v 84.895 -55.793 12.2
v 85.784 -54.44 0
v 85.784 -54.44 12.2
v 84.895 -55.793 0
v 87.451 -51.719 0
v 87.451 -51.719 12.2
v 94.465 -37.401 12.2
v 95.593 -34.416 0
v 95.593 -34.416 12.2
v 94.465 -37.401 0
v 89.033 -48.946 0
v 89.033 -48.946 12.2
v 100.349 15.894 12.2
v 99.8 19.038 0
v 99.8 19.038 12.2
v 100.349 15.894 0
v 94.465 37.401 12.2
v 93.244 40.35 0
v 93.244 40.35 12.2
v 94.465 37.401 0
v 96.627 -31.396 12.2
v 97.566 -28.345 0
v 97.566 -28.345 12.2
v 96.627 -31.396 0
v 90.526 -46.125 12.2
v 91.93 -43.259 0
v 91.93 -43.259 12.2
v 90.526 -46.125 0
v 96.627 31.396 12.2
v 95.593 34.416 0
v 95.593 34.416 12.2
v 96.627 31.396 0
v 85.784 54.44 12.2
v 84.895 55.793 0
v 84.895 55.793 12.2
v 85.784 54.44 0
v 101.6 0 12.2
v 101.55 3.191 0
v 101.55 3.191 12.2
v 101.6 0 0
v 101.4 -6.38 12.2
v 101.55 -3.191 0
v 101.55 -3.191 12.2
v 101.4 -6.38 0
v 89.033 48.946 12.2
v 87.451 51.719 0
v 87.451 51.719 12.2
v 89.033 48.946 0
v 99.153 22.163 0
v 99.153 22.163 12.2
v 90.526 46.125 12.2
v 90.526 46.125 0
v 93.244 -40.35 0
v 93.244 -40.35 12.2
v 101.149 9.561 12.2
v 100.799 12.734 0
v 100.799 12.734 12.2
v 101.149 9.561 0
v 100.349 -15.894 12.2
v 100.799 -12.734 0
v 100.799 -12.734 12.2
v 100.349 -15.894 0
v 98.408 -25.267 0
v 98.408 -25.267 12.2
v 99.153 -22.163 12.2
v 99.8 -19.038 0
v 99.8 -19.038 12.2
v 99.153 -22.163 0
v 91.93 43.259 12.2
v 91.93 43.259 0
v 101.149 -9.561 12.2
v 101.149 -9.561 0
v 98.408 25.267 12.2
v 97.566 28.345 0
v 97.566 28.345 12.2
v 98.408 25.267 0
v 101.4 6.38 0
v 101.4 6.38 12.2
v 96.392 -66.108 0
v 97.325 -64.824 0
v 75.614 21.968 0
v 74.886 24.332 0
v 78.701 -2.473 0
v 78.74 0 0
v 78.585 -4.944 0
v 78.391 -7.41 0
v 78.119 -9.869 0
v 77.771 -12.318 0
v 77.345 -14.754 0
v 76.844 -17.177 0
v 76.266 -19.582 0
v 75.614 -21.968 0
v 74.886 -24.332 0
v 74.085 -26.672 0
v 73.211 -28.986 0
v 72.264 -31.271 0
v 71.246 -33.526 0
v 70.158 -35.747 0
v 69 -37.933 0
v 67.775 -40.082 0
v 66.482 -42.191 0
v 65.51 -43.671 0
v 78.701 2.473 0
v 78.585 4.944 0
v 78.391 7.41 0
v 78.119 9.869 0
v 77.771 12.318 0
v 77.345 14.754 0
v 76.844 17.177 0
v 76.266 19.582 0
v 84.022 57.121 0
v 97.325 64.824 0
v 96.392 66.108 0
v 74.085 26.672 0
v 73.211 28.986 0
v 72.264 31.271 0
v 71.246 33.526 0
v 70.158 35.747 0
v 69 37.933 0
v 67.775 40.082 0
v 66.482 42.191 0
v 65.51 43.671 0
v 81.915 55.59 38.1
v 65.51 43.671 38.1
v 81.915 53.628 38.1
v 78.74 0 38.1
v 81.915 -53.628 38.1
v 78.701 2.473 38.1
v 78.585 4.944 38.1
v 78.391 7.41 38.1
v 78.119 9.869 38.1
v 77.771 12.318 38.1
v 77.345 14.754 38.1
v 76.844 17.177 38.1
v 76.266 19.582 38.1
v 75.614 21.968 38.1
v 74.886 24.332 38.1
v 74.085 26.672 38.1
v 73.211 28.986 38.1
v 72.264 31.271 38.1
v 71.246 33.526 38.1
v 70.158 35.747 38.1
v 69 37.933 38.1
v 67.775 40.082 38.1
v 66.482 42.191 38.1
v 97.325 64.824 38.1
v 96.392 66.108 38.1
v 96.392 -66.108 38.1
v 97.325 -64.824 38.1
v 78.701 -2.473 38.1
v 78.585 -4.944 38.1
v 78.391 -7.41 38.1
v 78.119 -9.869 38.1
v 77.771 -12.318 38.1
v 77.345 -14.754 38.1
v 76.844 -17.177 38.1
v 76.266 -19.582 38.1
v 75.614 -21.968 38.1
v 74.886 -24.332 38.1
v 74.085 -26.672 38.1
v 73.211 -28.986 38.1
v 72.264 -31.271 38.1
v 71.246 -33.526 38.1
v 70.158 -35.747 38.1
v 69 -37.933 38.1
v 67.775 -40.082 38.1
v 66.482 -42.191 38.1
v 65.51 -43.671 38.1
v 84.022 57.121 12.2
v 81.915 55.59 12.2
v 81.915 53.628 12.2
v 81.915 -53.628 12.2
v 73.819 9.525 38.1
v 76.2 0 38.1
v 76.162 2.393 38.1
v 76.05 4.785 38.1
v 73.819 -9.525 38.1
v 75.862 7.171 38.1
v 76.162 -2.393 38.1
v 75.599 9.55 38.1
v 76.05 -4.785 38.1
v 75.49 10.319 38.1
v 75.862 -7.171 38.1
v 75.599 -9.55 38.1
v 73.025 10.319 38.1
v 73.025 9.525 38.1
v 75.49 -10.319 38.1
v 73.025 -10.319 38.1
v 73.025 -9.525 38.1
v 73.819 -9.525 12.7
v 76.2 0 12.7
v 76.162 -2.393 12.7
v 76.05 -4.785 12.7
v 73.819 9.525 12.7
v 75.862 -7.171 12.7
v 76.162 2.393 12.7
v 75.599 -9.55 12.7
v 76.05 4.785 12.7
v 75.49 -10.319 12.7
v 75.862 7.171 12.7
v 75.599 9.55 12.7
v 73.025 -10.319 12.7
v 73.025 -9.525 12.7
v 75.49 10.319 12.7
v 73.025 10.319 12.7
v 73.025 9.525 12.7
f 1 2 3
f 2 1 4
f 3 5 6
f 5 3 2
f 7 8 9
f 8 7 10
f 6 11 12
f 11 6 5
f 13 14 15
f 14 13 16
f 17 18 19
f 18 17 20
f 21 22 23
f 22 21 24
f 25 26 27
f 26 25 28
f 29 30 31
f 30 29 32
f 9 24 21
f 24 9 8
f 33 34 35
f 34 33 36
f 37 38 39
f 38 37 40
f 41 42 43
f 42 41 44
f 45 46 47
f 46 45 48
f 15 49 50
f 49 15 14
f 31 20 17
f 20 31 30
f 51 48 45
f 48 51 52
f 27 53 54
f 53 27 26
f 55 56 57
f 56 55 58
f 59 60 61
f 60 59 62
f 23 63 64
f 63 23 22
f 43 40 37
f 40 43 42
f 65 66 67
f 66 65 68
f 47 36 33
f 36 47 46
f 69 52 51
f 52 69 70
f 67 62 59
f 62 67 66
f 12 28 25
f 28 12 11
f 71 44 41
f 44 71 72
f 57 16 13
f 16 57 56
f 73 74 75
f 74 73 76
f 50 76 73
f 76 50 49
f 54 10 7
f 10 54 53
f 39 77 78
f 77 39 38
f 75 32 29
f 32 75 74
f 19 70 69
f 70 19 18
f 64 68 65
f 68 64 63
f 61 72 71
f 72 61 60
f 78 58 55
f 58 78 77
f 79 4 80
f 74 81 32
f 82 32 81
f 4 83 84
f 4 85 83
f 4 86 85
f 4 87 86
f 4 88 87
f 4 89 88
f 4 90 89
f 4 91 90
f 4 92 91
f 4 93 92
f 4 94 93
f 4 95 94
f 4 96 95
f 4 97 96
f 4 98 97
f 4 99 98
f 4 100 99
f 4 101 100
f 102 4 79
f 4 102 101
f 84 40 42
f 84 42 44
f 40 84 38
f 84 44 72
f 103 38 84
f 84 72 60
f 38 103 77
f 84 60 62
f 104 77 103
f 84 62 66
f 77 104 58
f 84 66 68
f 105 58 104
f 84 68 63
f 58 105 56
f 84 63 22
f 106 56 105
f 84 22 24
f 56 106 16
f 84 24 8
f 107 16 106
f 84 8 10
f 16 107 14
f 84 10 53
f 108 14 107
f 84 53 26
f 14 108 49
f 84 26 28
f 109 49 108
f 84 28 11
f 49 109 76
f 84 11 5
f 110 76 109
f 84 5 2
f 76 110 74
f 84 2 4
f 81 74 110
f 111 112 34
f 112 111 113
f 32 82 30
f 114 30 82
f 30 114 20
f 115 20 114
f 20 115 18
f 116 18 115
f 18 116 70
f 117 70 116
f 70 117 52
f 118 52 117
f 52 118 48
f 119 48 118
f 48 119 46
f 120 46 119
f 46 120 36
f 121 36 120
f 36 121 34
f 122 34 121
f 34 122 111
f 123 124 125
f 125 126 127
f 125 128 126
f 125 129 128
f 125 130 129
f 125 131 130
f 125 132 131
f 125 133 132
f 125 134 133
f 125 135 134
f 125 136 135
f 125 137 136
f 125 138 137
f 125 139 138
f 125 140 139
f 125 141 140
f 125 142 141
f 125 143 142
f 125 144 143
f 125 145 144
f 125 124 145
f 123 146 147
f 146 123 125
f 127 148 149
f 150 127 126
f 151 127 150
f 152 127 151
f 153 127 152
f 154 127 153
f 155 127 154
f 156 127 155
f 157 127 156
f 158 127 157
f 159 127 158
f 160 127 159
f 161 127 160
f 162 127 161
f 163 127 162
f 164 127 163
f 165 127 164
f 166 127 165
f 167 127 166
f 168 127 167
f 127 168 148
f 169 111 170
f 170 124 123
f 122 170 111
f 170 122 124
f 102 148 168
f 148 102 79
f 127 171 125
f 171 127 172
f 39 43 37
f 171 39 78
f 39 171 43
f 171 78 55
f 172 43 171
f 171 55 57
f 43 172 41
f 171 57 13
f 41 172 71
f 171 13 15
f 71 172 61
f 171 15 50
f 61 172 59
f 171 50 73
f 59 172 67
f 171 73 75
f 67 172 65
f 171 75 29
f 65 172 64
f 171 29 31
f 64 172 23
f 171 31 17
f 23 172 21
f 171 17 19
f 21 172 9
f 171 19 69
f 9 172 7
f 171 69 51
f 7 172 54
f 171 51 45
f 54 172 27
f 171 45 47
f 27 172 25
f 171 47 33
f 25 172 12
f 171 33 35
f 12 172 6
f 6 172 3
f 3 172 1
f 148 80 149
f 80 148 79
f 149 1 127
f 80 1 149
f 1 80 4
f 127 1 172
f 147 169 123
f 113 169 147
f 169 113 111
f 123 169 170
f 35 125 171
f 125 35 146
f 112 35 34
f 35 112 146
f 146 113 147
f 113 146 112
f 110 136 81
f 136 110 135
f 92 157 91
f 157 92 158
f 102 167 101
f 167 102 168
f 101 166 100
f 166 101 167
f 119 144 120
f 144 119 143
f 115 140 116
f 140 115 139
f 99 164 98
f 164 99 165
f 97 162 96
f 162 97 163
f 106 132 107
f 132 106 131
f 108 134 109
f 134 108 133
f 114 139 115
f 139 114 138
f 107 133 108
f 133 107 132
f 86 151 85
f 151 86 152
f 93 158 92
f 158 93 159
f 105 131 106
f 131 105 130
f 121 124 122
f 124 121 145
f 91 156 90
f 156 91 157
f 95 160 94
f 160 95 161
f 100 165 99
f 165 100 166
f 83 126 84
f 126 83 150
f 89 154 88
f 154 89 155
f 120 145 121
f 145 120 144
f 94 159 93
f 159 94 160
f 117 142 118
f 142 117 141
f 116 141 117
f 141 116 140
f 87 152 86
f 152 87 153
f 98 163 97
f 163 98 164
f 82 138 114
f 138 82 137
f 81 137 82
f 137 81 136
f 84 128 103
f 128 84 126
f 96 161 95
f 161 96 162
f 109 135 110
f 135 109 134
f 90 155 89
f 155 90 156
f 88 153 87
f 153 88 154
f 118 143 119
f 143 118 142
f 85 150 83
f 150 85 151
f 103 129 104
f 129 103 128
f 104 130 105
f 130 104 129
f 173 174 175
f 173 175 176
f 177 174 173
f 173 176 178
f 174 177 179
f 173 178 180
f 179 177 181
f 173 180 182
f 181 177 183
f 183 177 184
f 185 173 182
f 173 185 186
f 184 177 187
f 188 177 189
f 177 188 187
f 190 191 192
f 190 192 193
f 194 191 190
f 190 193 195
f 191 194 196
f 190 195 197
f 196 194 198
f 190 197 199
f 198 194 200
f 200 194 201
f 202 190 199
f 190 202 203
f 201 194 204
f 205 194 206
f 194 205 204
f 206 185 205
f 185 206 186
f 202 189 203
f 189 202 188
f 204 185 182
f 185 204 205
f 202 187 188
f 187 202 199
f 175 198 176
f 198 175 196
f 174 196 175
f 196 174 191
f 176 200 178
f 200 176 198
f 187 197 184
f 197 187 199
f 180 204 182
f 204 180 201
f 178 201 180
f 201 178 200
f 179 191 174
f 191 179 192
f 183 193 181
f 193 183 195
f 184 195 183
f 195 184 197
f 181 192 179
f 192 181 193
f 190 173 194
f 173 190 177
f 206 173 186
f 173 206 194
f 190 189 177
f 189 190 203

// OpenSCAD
IN=25.4;
$fn=200;
module inner_clamp_jig(radius, width, height, thickness, wall_height, wall_width) {
    radius =radius *IN;
    height=height *IN;
    thickness=thickness *IN;
    width=width*IN;
    wall_height=wall_height*IN;
    wall_width=wall_width*IN;
    difference () {
        intersection() {
            translate([radius-thickness-wall_height,-width/2-wall_width,0]) color("red") cube([thickness+wall_height,width+wall_width*2, height]);
            cylinder(h=height, r=radius);
        }
        translate([radius-thickness-wall_height,-width/2,0]) color("blue") cube([wall_width,width, height]);
    }
}

module fin_clamp_jig(fin_width=0.25, radius=3.1, thickness=0.9, base=.125, angle=72, offset=10, height=1.5, reinforcement=1, blade_width=0.0625,
    blade_length=1.5) {
    fin_width=fin_width*IN;
    radius=radius*IN;
    thickness=thickness*IN;
    base=base*IN;
    height=height*IN;
    reinforcement=reinforcement*IN;
    blade_width=blade_width*IN;
    blade_length=blade_length*IN;
    outer=thickness+radius;
    epsilon=1;  // Not necessary, but it makes the preview look nicer in open SCAD
    rotate([0,0, -angle/2]) 
    difference () {
        union() {
            difference () {
                cylinder(h=height, r=outer);
                rotate([0, 0, angle])
                    translate([0, -fin_width/2, -epsilon]) 
                    cube([radius+3*IN, fin_width, height+2*epsilon]);
                translate([0, -fin_width/2, -epsilon])
                    cube([radius+3*IN, fin_width, height+2*epsilon]);
                rotate([0, 0, offset])
                    translate([radius+thickness/2+base, 0, reinforcement/2+height/2])
                    cube([thickness, radius*3, height-reinforcement+epsilon], center=true);
                rotate([0, 0, angle-offset])
                    translate([radius+thickness/2+base, 0, reinforcement/2+height/2])
                    cube([thickness, radius*3, height-reinforcement+epsilon], center=true);
            }


            translate([0, fin_width/2, 0])color("red")cube([radius+blade_length, blade_width, height]);
            rotate([0, 0, angle])translate([0, -fin_width/2-blade_width, 0])color("red")cube([radius+blade_length, blade_width, height]);
        }
        translate([0, 0, -epsilon]) 
            union () {
            cylinder(h=height+2*epsilon, r=radius);
            translate([0, -outer/2, height/2+epsilon])cube([2*outer, outer, height+2*epsilon], center=true);
            rotate([0, 0, angle+180]) translate([0, -outer/2, height/2+epsilon])cube([2*outer, outer, height+2*epsilon], center=true);
        }
    }
}
fin_clamp_jig(reinforcement=0.5,offset=36);
translate([0,0,0.5*IN]) inner_clamp_jig(3, .75, 1, 1/16, 1/16, 1/32);
